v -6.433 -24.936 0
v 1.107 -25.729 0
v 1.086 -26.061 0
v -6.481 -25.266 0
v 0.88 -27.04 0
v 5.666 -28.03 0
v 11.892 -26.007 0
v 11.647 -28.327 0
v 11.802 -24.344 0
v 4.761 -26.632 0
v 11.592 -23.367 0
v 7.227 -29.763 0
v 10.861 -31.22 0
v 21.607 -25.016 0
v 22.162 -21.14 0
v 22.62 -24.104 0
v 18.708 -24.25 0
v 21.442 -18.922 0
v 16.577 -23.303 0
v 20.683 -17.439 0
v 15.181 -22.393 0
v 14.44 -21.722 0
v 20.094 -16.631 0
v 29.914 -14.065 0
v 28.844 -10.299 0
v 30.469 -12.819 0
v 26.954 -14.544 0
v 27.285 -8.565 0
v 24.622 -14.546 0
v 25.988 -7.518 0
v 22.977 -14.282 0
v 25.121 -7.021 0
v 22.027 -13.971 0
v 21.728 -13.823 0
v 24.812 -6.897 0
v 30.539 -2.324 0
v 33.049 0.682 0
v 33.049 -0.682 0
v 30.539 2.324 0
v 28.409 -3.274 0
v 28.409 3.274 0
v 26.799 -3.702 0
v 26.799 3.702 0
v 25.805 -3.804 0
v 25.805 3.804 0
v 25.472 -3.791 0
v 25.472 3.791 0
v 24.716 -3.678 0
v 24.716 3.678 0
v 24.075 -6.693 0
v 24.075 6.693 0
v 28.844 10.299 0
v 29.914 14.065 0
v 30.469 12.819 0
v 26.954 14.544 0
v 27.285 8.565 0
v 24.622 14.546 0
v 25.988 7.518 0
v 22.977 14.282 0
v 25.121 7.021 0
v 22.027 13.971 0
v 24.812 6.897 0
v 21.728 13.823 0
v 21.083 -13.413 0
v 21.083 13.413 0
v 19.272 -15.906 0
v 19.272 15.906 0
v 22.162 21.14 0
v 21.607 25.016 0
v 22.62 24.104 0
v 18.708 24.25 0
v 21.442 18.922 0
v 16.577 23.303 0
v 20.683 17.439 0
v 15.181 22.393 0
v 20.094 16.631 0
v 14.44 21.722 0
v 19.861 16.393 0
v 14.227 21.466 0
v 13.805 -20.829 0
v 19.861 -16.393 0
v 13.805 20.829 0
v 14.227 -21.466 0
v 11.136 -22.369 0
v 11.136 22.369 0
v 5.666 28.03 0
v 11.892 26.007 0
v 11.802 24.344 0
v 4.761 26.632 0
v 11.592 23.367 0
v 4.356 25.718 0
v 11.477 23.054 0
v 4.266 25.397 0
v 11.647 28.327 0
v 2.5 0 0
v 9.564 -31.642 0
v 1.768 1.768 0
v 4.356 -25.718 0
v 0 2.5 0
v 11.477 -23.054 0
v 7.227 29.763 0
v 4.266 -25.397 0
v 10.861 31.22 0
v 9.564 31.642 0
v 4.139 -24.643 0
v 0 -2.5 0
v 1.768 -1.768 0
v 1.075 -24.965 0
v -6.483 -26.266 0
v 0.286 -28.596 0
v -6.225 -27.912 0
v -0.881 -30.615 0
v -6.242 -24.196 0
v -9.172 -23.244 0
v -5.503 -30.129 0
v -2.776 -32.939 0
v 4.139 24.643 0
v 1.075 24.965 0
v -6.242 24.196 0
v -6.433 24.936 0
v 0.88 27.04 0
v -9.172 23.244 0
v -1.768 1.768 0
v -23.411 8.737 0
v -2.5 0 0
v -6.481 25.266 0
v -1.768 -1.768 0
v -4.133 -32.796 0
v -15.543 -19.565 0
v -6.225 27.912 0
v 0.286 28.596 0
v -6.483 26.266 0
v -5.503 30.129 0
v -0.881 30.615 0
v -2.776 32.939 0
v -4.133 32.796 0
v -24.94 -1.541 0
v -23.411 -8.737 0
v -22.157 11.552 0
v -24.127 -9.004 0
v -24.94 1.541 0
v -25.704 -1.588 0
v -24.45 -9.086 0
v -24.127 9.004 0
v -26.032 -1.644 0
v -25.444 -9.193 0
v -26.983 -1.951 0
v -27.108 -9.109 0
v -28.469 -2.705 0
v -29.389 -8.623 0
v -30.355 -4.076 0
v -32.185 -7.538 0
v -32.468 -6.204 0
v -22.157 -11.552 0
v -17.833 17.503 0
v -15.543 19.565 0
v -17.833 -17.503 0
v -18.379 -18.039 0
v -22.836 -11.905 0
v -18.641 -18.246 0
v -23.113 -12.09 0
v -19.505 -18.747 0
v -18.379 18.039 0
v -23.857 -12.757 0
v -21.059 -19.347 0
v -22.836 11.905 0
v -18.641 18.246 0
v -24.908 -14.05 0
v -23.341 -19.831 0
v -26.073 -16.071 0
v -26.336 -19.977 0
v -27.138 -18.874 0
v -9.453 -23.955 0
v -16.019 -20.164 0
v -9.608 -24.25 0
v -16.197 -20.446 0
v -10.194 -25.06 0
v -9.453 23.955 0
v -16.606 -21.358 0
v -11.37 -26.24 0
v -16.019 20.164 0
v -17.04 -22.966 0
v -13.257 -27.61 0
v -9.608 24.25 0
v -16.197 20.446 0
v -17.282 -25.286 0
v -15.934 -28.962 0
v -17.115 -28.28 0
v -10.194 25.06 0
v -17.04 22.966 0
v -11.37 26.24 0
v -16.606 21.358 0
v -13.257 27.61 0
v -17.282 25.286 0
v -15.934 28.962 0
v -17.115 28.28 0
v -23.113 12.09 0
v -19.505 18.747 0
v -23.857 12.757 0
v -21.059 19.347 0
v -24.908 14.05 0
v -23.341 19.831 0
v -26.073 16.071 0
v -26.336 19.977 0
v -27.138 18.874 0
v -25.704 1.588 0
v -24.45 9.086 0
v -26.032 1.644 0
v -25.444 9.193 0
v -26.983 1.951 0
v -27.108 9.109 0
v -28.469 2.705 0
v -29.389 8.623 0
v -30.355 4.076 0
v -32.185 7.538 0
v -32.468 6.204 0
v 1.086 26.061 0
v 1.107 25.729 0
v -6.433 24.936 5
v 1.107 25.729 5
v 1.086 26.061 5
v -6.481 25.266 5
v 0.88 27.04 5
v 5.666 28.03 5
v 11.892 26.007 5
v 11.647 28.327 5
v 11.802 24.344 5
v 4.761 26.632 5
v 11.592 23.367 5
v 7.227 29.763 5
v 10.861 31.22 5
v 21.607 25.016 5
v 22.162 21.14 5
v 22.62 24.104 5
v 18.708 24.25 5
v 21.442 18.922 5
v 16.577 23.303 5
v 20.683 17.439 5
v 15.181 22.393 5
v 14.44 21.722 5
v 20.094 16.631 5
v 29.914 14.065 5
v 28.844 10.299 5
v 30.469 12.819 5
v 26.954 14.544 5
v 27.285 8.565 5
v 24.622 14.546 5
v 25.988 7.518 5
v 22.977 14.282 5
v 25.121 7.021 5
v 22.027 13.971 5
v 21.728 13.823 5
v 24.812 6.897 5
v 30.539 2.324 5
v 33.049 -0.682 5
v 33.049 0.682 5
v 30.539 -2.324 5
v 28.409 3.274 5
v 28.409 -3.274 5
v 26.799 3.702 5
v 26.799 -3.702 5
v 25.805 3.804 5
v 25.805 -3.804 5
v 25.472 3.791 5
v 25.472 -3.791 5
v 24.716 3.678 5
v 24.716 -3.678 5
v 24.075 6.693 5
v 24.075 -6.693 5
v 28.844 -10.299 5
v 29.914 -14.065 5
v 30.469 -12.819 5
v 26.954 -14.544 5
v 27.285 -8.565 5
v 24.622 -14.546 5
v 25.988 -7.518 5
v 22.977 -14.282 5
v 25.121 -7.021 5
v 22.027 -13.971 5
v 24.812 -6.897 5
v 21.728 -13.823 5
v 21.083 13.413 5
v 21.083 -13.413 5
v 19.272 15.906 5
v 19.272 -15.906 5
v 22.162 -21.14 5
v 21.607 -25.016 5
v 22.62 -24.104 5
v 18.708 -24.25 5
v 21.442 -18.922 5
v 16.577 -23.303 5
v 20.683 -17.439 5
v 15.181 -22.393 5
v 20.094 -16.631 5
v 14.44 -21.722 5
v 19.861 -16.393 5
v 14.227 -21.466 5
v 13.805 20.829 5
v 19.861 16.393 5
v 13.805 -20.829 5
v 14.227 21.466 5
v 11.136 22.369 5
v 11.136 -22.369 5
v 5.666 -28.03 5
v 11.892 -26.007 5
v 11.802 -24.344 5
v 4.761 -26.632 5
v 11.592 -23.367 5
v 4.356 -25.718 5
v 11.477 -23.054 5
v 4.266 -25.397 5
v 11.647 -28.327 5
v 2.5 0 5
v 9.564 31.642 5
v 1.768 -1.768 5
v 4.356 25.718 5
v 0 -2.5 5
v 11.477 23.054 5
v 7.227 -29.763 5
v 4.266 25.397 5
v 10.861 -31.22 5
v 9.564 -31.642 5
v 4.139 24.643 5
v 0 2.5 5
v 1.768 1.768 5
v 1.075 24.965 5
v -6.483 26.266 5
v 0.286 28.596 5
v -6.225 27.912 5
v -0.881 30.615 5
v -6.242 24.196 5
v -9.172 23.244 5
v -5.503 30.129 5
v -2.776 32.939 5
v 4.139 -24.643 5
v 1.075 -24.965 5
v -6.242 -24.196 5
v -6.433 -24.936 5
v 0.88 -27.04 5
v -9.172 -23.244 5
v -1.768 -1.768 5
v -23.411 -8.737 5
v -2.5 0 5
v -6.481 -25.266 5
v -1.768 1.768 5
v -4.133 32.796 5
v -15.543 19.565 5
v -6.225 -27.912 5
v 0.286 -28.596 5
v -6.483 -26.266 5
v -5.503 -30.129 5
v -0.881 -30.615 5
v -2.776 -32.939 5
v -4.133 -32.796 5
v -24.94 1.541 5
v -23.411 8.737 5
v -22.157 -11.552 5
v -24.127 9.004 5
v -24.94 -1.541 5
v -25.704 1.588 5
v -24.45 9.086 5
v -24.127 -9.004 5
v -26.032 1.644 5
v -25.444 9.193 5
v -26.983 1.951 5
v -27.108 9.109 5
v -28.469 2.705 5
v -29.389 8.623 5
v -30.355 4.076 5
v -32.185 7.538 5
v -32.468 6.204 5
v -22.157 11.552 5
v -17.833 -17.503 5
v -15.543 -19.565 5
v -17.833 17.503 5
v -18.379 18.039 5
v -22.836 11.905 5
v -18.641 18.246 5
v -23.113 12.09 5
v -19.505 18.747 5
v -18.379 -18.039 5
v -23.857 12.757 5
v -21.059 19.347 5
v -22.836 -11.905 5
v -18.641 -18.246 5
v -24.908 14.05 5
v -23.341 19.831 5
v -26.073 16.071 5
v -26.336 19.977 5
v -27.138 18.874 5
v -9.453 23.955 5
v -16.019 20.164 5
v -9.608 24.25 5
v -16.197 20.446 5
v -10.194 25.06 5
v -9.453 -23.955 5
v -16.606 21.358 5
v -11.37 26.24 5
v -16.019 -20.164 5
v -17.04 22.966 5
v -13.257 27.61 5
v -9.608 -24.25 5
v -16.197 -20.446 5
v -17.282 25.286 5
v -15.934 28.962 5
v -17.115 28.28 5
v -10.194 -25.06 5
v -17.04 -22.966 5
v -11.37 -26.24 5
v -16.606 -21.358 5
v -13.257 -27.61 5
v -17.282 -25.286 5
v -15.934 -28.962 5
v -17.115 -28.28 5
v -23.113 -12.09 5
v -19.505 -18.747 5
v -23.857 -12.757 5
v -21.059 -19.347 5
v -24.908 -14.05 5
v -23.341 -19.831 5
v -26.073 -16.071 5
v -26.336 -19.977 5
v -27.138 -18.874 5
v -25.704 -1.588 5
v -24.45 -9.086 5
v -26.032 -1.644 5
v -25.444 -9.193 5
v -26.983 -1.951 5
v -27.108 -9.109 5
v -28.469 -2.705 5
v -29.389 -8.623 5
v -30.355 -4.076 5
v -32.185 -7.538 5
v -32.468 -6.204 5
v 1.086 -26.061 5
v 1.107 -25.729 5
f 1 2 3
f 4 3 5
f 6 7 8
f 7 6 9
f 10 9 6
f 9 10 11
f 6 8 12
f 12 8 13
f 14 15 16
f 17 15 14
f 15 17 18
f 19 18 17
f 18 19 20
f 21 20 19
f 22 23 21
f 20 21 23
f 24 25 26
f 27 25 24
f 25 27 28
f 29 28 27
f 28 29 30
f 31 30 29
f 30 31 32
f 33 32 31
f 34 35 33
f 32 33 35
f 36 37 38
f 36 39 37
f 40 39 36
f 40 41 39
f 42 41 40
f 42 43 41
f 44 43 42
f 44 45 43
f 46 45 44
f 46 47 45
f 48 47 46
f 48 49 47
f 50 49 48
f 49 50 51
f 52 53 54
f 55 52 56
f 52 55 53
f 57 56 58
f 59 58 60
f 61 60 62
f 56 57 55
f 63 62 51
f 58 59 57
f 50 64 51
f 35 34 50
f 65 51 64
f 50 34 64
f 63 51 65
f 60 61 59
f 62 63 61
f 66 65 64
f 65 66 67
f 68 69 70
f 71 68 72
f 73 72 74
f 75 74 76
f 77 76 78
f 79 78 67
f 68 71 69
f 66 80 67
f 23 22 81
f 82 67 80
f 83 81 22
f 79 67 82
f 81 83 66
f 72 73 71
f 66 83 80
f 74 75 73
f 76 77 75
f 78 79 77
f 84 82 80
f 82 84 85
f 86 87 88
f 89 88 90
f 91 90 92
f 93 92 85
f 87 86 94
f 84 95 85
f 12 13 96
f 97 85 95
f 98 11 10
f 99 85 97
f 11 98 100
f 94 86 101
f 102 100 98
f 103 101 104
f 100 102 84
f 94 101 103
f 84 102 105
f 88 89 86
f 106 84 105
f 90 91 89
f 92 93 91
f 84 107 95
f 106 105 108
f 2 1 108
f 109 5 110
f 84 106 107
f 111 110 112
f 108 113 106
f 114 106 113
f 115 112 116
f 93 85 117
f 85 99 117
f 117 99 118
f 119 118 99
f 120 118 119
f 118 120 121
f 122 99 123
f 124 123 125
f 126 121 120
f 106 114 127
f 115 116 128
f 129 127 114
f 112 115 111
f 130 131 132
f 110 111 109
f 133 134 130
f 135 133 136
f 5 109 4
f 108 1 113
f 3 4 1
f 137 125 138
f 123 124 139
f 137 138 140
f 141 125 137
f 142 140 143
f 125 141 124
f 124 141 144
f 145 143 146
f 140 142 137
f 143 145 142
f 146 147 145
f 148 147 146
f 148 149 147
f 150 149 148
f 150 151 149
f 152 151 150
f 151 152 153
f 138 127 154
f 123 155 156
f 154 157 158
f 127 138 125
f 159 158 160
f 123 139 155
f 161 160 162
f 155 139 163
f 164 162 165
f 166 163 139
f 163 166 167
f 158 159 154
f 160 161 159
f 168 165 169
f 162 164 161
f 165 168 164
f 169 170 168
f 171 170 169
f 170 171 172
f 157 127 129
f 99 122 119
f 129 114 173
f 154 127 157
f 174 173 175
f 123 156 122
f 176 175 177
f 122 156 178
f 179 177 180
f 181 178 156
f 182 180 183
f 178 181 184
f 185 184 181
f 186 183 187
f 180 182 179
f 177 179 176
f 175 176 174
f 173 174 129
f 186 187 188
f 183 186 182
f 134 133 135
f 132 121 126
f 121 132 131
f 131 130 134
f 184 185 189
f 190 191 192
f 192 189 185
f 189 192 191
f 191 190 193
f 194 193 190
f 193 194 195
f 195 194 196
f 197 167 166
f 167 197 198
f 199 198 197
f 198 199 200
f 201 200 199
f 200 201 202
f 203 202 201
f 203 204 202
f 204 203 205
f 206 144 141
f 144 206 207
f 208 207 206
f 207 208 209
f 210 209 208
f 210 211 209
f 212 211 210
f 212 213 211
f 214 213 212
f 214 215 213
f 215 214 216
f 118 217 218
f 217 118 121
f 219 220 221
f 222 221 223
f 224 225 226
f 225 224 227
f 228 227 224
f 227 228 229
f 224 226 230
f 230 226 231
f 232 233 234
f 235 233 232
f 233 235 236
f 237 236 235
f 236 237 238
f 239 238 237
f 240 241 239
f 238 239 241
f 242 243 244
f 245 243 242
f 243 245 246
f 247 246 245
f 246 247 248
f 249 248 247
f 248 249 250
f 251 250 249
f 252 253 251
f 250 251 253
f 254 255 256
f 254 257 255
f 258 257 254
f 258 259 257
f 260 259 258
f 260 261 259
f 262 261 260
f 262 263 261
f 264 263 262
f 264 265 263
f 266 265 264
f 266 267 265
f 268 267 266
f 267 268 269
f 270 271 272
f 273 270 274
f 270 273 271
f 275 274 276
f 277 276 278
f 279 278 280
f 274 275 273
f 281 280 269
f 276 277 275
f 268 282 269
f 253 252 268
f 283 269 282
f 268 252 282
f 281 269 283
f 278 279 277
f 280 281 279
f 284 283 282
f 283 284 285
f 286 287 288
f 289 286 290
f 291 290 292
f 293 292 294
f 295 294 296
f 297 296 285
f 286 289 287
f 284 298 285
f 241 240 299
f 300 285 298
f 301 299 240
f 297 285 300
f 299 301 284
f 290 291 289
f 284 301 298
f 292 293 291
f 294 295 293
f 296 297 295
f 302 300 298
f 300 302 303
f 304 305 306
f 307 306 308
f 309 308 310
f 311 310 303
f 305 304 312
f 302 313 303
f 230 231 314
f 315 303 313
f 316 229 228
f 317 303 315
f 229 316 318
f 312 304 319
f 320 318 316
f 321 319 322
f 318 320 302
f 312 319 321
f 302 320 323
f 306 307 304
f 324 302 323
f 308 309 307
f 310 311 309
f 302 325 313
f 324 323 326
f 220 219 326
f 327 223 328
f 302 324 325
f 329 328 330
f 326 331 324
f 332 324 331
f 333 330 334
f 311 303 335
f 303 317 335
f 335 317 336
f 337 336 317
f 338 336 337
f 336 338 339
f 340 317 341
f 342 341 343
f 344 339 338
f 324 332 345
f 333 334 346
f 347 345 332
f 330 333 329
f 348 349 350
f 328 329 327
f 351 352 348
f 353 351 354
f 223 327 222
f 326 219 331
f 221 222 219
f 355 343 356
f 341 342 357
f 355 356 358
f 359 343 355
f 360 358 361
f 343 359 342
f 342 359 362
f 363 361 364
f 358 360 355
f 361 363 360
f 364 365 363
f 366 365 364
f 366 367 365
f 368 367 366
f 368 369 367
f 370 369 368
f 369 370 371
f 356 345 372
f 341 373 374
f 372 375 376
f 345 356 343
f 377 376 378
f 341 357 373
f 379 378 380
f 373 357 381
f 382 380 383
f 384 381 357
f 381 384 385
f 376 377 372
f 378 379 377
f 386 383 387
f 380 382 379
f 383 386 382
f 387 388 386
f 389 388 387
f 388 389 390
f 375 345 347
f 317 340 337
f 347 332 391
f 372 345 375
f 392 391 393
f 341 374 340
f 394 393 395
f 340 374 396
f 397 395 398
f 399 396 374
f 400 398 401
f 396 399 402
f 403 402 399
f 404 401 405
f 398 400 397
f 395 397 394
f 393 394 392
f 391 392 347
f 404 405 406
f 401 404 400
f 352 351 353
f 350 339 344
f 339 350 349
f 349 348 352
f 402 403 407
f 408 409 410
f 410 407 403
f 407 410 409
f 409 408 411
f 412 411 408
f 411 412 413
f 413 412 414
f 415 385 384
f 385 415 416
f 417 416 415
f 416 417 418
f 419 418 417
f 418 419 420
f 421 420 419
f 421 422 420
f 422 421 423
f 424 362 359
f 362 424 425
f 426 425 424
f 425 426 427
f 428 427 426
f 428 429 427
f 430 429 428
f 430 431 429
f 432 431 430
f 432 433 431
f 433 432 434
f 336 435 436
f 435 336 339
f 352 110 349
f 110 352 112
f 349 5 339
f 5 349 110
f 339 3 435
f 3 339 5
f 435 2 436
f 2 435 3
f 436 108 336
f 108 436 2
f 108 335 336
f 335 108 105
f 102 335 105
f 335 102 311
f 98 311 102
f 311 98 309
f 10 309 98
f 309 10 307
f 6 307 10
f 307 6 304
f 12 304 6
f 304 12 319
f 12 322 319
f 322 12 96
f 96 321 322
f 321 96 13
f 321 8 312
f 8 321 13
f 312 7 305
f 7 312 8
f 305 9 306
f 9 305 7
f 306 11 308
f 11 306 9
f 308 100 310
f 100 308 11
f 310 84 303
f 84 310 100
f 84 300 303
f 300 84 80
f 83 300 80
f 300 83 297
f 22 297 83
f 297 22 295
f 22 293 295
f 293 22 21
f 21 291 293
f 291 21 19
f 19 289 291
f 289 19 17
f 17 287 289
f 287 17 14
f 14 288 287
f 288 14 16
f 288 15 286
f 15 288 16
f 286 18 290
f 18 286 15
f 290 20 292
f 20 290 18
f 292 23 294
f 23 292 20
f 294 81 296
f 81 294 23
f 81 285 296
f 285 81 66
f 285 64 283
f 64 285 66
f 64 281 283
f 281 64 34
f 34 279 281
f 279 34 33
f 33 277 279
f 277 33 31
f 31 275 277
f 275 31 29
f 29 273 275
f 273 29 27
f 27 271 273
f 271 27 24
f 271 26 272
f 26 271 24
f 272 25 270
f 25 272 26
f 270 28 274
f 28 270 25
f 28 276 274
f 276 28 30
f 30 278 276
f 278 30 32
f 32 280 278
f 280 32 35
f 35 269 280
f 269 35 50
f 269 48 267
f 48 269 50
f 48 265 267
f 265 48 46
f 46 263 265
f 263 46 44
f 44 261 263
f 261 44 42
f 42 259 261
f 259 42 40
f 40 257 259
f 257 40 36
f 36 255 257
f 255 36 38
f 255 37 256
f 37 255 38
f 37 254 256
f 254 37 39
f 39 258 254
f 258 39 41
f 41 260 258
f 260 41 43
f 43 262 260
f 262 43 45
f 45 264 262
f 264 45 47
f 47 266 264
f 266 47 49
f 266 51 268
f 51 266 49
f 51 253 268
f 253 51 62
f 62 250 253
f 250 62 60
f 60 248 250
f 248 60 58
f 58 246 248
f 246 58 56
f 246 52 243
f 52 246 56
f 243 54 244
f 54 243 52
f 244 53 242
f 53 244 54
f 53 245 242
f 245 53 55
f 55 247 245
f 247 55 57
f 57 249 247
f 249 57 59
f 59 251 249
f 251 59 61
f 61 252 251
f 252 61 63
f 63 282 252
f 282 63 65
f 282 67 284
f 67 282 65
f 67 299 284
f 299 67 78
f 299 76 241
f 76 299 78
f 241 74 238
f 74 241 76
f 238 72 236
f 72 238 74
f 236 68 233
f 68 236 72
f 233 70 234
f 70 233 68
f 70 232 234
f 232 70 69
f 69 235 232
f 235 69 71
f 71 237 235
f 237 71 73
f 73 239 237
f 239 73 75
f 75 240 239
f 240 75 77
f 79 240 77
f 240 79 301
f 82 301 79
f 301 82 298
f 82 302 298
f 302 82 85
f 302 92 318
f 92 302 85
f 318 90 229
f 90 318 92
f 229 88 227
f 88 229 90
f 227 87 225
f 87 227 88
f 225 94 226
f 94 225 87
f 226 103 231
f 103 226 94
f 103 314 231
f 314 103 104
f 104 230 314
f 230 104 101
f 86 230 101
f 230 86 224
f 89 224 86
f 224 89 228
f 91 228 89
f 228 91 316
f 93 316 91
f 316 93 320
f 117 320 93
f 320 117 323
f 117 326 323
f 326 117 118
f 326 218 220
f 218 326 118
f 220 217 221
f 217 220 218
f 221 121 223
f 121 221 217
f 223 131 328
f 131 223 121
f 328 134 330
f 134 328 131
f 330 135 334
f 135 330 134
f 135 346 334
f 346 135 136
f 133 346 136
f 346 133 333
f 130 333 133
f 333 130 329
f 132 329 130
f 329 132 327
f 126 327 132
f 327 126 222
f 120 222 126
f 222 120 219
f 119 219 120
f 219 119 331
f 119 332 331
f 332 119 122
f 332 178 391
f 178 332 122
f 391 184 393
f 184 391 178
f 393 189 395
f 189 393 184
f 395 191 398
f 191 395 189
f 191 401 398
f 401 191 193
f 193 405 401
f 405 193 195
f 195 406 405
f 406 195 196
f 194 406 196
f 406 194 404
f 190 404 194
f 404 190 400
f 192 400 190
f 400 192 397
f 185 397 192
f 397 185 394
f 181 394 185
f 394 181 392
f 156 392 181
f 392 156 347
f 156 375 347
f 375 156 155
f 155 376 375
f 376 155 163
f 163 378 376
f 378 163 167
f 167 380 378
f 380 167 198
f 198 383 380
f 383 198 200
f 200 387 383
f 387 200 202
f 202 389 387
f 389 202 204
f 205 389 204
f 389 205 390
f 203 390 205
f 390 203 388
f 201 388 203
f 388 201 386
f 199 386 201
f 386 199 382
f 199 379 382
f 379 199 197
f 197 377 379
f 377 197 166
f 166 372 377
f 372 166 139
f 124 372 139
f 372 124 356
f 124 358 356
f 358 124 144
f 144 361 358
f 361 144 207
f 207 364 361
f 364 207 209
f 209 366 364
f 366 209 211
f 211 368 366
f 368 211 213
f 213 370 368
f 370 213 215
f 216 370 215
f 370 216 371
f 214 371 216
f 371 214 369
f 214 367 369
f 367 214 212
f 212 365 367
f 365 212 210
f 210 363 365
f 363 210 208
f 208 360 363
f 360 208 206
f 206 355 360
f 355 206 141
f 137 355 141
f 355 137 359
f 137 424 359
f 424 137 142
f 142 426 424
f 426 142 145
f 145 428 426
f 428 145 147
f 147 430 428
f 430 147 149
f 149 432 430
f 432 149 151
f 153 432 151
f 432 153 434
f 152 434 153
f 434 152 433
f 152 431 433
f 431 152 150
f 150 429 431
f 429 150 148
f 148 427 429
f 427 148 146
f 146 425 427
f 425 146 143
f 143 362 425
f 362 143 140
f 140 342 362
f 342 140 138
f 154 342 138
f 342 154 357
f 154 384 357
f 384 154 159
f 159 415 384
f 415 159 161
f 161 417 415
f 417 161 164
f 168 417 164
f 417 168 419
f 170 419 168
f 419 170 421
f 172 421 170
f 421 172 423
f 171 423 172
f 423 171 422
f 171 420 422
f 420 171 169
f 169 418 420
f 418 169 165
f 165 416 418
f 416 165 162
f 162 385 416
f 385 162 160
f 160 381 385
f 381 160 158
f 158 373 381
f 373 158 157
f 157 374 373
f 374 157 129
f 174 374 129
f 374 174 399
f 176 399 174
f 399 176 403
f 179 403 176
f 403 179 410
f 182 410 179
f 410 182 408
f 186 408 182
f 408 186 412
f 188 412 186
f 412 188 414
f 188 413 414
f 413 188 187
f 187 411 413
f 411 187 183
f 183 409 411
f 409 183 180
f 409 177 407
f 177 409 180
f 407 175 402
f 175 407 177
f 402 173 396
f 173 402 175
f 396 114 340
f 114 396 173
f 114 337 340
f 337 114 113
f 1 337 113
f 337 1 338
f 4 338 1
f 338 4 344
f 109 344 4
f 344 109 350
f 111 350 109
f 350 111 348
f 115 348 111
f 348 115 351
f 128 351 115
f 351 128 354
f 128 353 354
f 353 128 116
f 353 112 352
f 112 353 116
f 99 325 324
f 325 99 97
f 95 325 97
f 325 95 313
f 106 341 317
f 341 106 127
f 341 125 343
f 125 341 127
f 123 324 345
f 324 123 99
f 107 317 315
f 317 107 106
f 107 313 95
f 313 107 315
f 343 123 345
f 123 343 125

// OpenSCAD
// Parametric Involute Bevel and Spur Gears by GregFrost
// It is licensed under the Creative Commons - GNU LGPL 2.1 license.
// © 2010 by GregFrost, thingiverse.com/Amp
// http://www.thingiverse.com/thing:3575 and http://www.thingiverse.com/thing:3752

// Simple Test:
gear (circular_pitch=700,
	gear_thickness = 5,
	rim_thickness = 5,
	hub_thickness = 5,
	circles=0);

pi=3.1415926535897932384626433832795;


//==================================================
// Bevel Gears:
// Two gears with the same cone distance, circular pitch (measured at the cone distance)
// and pressure angle will mesh.

module gear (
	number_of_teeth=15,
	circular_pitch=false, diametral_pitch=false,
	pressure_angle=28,
	clearance = 0.2,
	gear_thickness=5,
	rim_thickness=8,
	rim_width=5,
	hub_thickness=10,
	hub_diameter=15,
	bore_diameter=5,
	circles=0,
	backlash=0,
	twist=0,
	involute_facets=0,
	flat=false)
{
	if (circular_pitch==false && diametral_pitch==false)
		echo("MCAD ERROR: gear module needs either a diametral_pitch or circular_pitch");

	//Convert diametrial pitch to our native circular pitch
	circular_pitch = (circular_pitch!=false?circular_pitch:180/diametral_pitch);

	// Pitch diameter: Diameter of pitch circle.
	pitch_diameter  =  number_of_teeth * circular_pitch / 180;
	pitch_radius = pitch_diameter/2;
	echo ("Teeth:", number_of_teeth, " Pitch radius:", pitch_radius);

	// Base Circle
	base_radius = pitch_radius*cos(pressure_angle);

	// Diametrial pitch: Number of teeth per unit length.
	pitch_diametrial = number_of_teeth / pitch_diameter;

	// Addendum: Radial distance from pitch circle to outside circle.
	addendum = 1/pitch_diametrial;

	//Outer Circle
	outer_radius = pitch_radius+addendum;

//Use if statement and mix/max to select tooth count and circular pitch that creates a radius that is smaller than the OD of the CKp3

echo("radius",outer_radius);



	// Dedendum: Radial distance from pitch circle to root diameter
	dedendum = addendum + clearance;

	// Root diameter: Diameter of bottom of tooth spaces.
	root_radius = pitch_radius-dedendum;
	backlash_angle = backlash / pitch_radius * 180 / pi;
	half_thick_angle = (360 / number_of_teeth - backlash_angle) / 4;

	// Variables controlling the rim.
	rim_radius = root_radius - rim_width;

	// Variables controlling the circular holes in the gear.
	circle_orbit_diameter=hub_diameter/2+rim_radius;
	circle_orbit_curcumference=pi*circle_orbit_diameter;

	// Limit the circle size to 90% of the gear face.
	circle_diameter=
		min (
			0.70*circle_orbit_curcumference/circles,
			(rim_radius-hub_diameter/2)*0.9);

	difference()
	{
		union ()
		{
			difference ()
			{
				linear_exturde_flat_option(flat=flat, height=rim_thickness, convexity=10, twist=twist)
				gear_shape (
					number_of_teeth,
					pitch_radius = pitch_radius,
					root_radius = root_radius,
					base_radius = base_radius,
					outer_radius = outer_radius,
					half_thick_angle = half_thick_angle,
					involute_facets=involute_facets);

				if (gear_thickness < rim_thickness)
					translate ([0,0,gear_thickness])
					cylinder (r=rim_radius,h=rim_thickness-gear_thickness+1);
			}
			if (gear_thickness > rim_thickness)
				linear_exturde_flat_option(flat=flat, height=gear_thickness)
				circle (r=rim_radius);
			if (flat == false && hub_thickness > gear_thickness)
				translate ([0,0,gear_thickness])
				linear_exturde_flat_option(flat=flat, height=hub_thickness-gear_thickness)
				circle (r=hub_diameter/2);
		}
		translate ([0,0,-1])
		linear_exturde_flat_option(flat =flat, height=2+max(rim_thickness,hub_thickness,gear_thickness))
		circle (r=bore_diameter/2);
		if (circles>0)
		{
			for(i=[0:circles-1])
				rotate([0,0,i*360/circles])
				translate([circle_orbit_diameter/2,0,-1])
				linear_exturde_flat_option(flat =flat, height=max(gear_thickness,rim_thickness)+3)
				circle(r=circle_diameter/2);
		}
	}
}

module linear_exturde_flat_option(flat =false, height = 10, center = false, convexity = 2, twist = 0)
{
	if(flat==false)
	{
		linear_extrude(height = height, center = center, convexity = convexity, twist= twist) child(0);
	}
	else
	{
		child(0);
	}

}

module gear_shape (
	number_of_teeth,
	pitch_radius,
	root_radius,
	base_radius,
	outer_radius,
	half_thick_angle,
	involute_facets)
{
	union()
	{
		rotate (half_thick_angle) circle ($fn=number_of_teeth*2, r=root_radius);

		for (i = [1:number_of_teeth])
		{
			rotate ([0,0,i*360/number_of_teeth])
			{
				involute_gear_tooth (
					pitch_radius = pitch_radius,
					root_radius = root_radius,
					base_radius = base_radius,
					outer_radius = outer_radius,
					half_thick_angle = half_thick_angle,
					involute_facets=involute_facets);
			}
		}
	}
}

module involute_gear_tooth (
	pitch_radius,
	root_radius,
	base_radius,
	outer_radius,
	half_thick_angle,
	involute_facets)
{
	min_radius = max (base_radius,root_radius);

	pitch_point = involute (base_radius, involute_intersect_angle (base_radius, pitch_radius));
	pitch_angle = atan2 (pitch_point[1], pitch_point[0]);
	centre_angle = pitch_angle + half_thick_angle;

	start_angle = involute_intersect_angle (base_radius, min_radius);
	stop_angle = involute_intersect_angle (base_radius, outer_radius);

	res=(involute_facets!=0)?involute_facets:($fn==0)?5:$fn/4;

	union ()
	{
		for (i=[1:res])
		assign (
			point1=involute (base_radius,start_angle+(stop_angle - start_angle)*(i-1)/res),
			point2=involute (base_radius,start_angle+(stop_angle - start_angle)*i/res))
		{
			assign (
				side1_point1=rotate_point (centre_angle, point1),
				side1_point2=rotate_point (centre_angle, point2),
				side2_point1=mirror_point (rotate_point (centre_angle, point1)),
				side2_point2=mirror_point (rotate_point (centre_angle, point2)))
			{
				polygon (
					points=[[0,0],side1_point1,side1_point2,side2_point2,side2_point1],
					paths=[[0,1,2,3,4,0]]);
			}
		}
	}
}

// Mathematical Functions
//===============

// Finds the angle of the involute about the base radius at the given distance (radius) from it's center.
//source: http://www.mathhelpforum.com/math-help/geometry/136011-circle-involute-solving-y-any-given-x.html

function involute_intersect_angle (base_radius, radius) = sqrt (pow (radius/base_radius, 2) - 1) * 180 / pi;

// Calculate the involute position for a given base radius and involute angle.

function rotated_involute (rotate, base_radius, involute_angle) =
[
	cos (rotate) * involute (base_radius, involute_angle)[0] + sin (rotate) * involute (base_radius, involute_angle)[1],
	cos (rotate) * involute (base_radius, involute_angle)[1] - sin (rotate) * involute (base_radius, involute_angle)[0]
];

function mirror_point (coord) =
[
	coord[0],
	-coord[1]
];

function rotate_point (rotate, coord) =
[
	cos (rotate) * coord[0] + sin (rotate) * coord[1],
	cos (rotate) * coord[1] - sin (rotate) * coord[0]
];

function involute (base_radius, involute_angle) =
[
	base_radius*(cos (involute_angle) + involute_angle*pi/180*sin (involute_angle)),
	base_radius*(sin (involute_angle) - involute_angle*pi/180*cos (involute_angle))
];
